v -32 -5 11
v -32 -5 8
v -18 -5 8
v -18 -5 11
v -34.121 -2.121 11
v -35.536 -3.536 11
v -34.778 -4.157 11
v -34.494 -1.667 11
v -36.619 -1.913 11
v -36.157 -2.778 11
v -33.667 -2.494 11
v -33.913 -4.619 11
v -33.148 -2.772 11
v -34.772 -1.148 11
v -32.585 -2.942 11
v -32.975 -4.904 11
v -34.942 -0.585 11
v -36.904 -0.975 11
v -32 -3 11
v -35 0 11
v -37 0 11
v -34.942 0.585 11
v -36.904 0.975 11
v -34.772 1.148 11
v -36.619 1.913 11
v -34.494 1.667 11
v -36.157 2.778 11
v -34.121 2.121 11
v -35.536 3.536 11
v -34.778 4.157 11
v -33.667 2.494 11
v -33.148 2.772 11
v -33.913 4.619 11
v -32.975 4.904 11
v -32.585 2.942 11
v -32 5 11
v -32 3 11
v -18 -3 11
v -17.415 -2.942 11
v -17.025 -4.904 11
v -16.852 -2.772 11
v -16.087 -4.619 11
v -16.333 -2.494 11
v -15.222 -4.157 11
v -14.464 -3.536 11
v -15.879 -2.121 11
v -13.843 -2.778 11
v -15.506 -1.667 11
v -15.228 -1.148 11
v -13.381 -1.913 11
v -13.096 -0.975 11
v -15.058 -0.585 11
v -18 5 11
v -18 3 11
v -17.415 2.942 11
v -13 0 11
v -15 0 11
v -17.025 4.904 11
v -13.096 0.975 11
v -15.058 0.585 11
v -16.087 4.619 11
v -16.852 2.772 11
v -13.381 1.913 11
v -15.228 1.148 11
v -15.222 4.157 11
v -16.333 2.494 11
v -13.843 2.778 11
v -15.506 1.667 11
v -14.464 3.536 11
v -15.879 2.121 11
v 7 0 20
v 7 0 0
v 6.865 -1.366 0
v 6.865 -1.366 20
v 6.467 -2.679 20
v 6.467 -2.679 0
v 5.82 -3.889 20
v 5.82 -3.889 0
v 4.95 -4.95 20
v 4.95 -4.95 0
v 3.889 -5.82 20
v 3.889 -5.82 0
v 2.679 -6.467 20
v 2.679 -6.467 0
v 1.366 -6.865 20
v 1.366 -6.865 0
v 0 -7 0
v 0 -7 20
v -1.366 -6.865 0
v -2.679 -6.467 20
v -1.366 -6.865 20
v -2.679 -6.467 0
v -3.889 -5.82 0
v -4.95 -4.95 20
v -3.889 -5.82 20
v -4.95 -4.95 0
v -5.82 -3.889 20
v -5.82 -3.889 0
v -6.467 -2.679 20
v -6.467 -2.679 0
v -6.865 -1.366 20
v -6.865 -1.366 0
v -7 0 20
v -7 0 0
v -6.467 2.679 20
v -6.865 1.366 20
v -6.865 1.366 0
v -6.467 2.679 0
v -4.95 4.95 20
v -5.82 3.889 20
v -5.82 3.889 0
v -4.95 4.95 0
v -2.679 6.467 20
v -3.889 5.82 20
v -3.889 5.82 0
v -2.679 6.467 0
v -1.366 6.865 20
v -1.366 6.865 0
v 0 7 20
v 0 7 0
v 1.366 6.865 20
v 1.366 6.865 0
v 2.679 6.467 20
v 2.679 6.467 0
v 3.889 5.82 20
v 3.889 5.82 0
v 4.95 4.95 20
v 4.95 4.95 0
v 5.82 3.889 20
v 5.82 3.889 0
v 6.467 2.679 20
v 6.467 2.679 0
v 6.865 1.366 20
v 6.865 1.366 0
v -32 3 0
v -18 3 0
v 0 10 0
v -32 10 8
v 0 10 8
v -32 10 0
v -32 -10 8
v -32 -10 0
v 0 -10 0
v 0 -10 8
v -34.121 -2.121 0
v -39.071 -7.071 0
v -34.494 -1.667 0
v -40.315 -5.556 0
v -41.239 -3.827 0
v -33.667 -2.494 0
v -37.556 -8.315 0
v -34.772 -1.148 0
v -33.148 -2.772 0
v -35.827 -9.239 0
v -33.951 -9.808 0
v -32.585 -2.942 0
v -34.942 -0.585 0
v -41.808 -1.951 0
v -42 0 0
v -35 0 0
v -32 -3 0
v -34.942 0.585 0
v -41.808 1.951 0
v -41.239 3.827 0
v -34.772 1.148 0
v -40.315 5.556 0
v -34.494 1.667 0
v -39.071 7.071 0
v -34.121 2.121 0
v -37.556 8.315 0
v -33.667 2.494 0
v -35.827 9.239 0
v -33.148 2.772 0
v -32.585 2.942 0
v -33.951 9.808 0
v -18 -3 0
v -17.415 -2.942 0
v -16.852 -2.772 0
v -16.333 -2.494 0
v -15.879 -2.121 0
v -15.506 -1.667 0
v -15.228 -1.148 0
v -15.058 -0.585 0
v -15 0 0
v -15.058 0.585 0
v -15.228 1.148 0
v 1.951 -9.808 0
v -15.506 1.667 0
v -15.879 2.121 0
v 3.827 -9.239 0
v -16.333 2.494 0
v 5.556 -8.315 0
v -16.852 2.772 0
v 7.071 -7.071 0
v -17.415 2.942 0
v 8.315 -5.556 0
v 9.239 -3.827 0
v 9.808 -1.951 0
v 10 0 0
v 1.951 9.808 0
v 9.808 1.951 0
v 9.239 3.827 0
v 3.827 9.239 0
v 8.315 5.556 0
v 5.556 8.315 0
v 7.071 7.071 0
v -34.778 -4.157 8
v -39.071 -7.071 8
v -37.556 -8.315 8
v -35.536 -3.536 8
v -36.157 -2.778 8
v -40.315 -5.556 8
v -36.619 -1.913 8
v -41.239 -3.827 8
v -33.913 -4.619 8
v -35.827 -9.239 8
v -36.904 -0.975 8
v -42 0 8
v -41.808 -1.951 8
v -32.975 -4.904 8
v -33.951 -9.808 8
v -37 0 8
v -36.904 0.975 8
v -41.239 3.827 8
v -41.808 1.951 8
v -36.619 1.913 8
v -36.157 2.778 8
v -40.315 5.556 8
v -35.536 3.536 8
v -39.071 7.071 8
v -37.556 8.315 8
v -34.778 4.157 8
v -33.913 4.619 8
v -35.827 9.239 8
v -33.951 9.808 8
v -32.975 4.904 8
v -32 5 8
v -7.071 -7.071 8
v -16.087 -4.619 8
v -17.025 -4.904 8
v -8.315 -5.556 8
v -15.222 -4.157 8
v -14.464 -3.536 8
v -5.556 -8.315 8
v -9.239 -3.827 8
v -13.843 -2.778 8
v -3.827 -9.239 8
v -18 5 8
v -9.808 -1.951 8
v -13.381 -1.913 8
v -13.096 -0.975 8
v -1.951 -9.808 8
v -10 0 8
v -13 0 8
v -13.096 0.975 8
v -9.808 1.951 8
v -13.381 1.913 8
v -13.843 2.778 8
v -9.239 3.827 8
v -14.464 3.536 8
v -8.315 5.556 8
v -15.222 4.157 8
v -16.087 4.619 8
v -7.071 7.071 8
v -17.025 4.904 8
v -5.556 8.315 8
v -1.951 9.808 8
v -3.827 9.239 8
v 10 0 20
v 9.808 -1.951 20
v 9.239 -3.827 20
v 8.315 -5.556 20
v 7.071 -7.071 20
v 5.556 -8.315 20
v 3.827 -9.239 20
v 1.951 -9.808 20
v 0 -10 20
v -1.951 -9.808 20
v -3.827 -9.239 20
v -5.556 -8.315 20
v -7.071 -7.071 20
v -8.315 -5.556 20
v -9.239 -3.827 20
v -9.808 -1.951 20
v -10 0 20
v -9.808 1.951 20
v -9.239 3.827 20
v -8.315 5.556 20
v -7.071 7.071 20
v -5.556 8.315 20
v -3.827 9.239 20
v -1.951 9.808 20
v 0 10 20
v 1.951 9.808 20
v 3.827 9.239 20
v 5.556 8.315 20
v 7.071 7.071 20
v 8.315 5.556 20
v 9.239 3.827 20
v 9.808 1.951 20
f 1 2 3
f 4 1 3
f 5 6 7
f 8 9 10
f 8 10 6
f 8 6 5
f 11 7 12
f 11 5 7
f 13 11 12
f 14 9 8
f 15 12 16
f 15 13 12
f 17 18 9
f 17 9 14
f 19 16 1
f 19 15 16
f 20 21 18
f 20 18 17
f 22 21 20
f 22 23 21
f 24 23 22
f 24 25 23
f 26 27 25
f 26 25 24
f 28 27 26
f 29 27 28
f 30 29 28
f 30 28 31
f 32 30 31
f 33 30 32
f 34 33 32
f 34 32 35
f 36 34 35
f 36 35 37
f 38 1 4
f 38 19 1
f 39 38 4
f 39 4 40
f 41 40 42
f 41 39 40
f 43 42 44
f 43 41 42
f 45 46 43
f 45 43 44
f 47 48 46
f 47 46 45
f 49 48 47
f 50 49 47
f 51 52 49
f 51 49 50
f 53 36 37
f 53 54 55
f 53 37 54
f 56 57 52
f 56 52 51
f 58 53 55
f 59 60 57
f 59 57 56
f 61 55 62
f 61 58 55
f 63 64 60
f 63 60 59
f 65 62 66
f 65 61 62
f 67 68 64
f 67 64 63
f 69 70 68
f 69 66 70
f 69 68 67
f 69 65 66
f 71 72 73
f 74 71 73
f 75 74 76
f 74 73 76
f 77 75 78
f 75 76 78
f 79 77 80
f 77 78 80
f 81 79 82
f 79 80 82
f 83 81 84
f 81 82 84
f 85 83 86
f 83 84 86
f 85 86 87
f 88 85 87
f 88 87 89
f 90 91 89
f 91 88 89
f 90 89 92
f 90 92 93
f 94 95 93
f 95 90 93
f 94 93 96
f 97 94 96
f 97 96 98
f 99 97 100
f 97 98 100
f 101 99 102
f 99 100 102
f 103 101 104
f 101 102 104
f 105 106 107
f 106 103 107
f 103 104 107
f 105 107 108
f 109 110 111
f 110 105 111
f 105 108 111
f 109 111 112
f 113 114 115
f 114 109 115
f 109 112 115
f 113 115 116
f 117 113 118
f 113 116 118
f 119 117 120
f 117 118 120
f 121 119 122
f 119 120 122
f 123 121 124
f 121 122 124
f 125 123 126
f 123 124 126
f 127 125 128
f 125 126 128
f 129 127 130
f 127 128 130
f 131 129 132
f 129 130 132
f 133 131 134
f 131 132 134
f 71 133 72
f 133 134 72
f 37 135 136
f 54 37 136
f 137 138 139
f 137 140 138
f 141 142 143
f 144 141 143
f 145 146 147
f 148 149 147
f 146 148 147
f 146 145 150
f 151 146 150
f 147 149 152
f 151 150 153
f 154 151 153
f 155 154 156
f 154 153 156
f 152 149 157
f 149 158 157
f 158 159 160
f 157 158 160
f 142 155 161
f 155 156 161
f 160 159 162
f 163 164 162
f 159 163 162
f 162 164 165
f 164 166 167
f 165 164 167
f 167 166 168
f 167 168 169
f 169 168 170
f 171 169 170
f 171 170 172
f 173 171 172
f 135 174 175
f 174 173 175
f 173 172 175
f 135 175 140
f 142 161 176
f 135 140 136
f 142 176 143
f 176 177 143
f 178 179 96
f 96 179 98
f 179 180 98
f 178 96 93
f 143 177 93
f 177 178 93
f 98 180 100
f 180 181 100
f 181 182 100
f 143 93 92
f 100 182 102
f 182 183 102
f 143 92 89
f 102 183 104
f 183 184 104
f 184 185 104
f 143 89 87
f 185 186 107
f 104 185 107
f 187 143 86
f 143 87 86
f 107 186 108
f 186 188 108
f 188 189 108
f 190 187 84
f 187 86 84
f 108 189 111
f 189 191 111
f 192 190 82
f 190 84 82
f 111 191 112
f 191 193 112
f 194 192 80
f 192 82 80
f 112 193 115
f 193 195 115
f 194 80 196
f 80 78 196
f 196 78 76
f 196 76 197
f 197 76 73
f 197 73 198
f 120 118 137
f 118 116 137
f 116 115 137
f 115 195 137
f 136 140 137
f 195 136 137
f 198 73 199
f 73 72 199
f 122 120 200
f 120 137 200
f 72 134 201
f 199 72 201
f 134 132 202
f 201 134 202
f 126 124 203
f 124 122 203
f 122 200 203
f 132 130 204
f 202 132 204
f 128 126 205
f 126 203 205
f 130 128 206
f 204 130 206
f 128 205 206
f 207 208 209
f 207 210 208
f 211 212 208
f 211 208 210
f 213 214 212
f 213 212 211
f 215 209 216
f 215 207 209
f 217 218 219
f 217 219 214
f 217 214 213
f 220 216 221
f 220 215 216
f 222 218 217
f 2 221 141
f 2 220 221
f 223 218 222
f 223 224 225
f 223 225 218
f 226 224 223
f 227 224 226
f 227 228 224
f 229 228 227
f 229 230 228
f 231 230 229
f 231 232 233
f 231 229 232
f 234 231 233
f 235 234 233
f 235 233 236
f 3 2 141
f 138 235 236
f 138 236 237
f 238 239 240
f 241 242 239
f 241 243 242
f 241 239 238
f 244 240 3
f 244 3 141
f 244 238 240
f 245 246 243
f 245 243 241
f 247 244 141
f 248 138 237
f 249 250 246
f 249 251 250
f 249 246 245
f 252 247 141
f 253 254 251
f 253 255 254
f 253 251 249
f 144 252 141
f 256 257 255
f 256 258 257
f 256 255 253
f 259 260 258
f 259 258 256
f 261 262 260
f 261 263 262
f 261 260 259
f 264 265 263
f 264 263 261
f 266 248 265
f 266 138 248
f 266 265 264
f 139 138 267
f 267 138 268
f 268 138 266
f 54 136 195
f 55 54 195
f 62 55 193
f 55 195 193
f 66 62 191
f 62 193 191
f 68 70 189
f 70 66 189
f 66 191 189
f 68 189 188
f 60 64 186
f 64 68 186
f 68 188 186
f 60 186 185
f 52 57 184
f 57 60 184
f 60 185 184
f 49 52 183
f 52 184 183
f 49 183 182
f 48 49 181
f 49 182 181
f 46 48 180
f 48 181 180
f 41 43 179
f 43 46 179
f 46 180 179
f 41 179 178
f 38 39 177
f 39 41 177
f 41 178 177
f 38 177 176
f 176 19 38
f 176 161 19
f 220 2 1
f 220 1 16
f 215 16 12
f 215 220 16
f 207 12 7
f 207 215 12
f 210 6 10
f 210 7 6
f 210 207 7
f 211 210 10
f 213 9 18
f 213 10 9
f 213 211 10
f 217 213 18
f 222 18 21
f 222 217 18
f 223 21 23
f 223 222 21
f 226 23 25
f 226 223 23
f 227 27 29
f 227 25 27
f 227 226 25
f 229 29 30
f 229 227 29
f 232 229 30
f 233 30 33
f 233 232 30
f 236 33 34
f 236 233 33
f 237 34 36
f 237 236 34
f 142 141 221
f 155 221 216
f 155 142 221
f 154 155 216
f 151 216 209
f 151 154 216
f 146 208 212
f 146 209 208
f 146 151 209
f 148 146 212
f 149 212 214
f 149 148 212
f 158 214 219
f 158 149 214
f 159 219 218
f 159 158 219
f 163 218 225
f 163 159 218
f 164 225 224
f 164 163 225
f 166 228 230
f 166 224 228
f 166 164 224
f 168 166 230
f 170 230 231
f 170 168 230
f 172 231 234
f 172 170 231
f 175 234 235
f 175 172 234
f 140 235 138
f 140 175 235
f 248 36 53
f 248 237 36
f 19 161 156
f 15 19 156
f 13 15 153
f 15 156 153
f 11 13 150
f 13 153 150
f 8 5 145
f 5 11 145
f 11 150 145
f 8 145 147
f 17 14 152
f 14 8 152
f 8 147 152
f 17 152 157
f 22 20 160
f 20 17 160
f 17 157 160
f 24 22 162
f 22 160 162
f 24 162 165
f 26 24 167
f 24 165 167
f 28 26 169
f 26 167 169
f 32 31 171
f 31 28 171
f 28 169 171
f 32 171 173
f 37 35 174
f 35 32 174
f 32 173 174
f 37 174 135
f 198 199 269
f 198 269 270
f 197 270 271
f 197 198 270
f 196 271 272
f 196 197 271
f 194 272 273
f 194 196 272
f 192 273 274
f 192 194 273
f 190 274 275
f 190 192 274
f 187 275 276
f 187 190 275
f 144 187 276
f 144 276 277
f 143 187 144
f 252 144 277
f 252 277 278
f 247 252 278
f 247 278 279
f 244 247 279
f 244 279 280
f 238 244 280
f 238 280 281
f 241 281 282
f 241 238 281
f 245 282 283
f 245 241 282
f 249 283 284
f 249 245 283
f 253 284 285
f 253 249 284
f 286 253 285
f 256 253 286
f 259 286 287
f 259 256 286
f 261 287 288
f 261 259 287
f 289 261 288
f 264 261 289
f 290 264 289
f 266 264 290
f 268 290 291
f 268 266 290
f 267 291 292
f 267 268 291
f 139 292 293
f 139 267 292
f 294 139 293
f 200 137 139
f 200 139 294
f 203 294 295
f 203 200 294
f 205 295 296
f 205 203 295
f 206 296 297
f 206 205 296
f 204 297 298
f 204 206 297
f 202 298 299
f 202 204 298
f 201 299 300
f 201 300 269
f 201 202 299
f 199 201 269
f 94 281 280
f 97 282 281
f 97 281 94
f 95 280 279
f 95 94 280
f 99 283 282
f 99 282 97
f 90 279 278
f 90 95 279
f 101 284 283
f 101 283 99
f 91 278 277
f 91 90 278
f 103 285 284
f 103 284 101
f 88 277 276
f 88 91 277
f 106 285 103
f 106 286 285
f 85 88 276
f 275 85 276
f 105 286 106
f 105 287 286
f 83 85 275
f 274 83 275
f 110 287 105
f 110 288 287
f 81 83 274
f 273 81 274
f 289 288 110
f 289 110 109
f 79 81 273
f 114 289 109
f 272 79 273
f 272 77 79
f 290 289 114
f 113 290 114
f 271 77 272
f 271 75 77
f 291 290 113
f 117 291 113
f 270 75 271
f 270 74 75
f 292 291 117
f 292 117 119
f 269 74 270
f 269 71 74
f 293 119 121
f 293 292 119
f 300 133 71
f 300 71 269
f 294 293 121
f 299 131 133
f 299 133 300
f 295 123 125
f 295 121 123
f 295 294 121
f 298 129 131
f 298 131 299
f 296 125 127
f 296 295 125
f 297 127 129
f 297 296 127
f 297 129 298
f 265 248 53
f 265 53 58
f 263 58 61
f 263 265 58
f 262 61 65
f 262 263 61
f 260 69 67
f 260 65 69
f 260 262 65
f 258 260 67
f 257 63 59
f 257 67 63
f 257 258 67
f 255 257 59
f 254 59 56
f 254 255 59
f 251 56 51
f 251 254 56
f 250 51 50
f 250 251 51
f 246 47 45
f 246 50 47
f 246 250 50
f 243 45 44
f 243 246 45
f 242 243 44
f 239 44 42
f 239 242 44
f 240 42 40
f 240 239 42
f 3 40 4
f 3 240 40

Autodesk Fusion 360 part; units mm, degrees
sketch "草图1" plane through (0, 0, 0) normal (0, 0, 1) x (1, 0, 0)
  line L0 (-75, 0) -> (-70, 0) construction
  line L1 (-70, 0) -> (75, 0) construction
  line L2 (0, 50) -> (0, -52.1887) construction
  circle A0 centre (0, 0) radius 7
  circle A1 centre (0, 0) radius 10
  line L3 (-32, 5) -> (-18, 5)
  line L4 (-32, -5) -> (-18, -5)
  line L5 (-32, -3) -> (-18, -3)
  line L6 (-32, 3) -> (-18, 3)
  line L7 (-32, 10) -> (0, 10)
  line L8 (-32, -10) -> (0, -10)
  arc A2 (-32, 5) -> (-32, -5) centre (-32, 0) ccw
  arc A3 (-32, 3) -> (-32, -3) centre (-32, 0) ccw
  arc A4 (-18, -3) -> (-18, 3) centre (-18, 0) ccw
  arc A5 (-18, -5) -> (-18, 5) centre (-18, 0) ccw
  arc A6 (-32, 10) -> (-32, -10) centre (-32, 0) ccw
  dimension "d1" = 5
  dimension "d2" = 14
  dimension "d3" = 3
  dimension "d4" = 5
  dimension "d5" = 3
  dimension "d6" = 20
  dimension "d7" = 14
  dimension "d8" = 18
  dimension "d9" = 14
extrude "拉伸1" add sketch "草图1" along normal blind 8 contours A1 L7 L8 A6
extrude "拉伸2" add sketch "草图1" along normal blind 20 contours A1
extrude "拉伸3" add sketch "草图1" along normal blind 11 contours L3 L4 A2 A5
